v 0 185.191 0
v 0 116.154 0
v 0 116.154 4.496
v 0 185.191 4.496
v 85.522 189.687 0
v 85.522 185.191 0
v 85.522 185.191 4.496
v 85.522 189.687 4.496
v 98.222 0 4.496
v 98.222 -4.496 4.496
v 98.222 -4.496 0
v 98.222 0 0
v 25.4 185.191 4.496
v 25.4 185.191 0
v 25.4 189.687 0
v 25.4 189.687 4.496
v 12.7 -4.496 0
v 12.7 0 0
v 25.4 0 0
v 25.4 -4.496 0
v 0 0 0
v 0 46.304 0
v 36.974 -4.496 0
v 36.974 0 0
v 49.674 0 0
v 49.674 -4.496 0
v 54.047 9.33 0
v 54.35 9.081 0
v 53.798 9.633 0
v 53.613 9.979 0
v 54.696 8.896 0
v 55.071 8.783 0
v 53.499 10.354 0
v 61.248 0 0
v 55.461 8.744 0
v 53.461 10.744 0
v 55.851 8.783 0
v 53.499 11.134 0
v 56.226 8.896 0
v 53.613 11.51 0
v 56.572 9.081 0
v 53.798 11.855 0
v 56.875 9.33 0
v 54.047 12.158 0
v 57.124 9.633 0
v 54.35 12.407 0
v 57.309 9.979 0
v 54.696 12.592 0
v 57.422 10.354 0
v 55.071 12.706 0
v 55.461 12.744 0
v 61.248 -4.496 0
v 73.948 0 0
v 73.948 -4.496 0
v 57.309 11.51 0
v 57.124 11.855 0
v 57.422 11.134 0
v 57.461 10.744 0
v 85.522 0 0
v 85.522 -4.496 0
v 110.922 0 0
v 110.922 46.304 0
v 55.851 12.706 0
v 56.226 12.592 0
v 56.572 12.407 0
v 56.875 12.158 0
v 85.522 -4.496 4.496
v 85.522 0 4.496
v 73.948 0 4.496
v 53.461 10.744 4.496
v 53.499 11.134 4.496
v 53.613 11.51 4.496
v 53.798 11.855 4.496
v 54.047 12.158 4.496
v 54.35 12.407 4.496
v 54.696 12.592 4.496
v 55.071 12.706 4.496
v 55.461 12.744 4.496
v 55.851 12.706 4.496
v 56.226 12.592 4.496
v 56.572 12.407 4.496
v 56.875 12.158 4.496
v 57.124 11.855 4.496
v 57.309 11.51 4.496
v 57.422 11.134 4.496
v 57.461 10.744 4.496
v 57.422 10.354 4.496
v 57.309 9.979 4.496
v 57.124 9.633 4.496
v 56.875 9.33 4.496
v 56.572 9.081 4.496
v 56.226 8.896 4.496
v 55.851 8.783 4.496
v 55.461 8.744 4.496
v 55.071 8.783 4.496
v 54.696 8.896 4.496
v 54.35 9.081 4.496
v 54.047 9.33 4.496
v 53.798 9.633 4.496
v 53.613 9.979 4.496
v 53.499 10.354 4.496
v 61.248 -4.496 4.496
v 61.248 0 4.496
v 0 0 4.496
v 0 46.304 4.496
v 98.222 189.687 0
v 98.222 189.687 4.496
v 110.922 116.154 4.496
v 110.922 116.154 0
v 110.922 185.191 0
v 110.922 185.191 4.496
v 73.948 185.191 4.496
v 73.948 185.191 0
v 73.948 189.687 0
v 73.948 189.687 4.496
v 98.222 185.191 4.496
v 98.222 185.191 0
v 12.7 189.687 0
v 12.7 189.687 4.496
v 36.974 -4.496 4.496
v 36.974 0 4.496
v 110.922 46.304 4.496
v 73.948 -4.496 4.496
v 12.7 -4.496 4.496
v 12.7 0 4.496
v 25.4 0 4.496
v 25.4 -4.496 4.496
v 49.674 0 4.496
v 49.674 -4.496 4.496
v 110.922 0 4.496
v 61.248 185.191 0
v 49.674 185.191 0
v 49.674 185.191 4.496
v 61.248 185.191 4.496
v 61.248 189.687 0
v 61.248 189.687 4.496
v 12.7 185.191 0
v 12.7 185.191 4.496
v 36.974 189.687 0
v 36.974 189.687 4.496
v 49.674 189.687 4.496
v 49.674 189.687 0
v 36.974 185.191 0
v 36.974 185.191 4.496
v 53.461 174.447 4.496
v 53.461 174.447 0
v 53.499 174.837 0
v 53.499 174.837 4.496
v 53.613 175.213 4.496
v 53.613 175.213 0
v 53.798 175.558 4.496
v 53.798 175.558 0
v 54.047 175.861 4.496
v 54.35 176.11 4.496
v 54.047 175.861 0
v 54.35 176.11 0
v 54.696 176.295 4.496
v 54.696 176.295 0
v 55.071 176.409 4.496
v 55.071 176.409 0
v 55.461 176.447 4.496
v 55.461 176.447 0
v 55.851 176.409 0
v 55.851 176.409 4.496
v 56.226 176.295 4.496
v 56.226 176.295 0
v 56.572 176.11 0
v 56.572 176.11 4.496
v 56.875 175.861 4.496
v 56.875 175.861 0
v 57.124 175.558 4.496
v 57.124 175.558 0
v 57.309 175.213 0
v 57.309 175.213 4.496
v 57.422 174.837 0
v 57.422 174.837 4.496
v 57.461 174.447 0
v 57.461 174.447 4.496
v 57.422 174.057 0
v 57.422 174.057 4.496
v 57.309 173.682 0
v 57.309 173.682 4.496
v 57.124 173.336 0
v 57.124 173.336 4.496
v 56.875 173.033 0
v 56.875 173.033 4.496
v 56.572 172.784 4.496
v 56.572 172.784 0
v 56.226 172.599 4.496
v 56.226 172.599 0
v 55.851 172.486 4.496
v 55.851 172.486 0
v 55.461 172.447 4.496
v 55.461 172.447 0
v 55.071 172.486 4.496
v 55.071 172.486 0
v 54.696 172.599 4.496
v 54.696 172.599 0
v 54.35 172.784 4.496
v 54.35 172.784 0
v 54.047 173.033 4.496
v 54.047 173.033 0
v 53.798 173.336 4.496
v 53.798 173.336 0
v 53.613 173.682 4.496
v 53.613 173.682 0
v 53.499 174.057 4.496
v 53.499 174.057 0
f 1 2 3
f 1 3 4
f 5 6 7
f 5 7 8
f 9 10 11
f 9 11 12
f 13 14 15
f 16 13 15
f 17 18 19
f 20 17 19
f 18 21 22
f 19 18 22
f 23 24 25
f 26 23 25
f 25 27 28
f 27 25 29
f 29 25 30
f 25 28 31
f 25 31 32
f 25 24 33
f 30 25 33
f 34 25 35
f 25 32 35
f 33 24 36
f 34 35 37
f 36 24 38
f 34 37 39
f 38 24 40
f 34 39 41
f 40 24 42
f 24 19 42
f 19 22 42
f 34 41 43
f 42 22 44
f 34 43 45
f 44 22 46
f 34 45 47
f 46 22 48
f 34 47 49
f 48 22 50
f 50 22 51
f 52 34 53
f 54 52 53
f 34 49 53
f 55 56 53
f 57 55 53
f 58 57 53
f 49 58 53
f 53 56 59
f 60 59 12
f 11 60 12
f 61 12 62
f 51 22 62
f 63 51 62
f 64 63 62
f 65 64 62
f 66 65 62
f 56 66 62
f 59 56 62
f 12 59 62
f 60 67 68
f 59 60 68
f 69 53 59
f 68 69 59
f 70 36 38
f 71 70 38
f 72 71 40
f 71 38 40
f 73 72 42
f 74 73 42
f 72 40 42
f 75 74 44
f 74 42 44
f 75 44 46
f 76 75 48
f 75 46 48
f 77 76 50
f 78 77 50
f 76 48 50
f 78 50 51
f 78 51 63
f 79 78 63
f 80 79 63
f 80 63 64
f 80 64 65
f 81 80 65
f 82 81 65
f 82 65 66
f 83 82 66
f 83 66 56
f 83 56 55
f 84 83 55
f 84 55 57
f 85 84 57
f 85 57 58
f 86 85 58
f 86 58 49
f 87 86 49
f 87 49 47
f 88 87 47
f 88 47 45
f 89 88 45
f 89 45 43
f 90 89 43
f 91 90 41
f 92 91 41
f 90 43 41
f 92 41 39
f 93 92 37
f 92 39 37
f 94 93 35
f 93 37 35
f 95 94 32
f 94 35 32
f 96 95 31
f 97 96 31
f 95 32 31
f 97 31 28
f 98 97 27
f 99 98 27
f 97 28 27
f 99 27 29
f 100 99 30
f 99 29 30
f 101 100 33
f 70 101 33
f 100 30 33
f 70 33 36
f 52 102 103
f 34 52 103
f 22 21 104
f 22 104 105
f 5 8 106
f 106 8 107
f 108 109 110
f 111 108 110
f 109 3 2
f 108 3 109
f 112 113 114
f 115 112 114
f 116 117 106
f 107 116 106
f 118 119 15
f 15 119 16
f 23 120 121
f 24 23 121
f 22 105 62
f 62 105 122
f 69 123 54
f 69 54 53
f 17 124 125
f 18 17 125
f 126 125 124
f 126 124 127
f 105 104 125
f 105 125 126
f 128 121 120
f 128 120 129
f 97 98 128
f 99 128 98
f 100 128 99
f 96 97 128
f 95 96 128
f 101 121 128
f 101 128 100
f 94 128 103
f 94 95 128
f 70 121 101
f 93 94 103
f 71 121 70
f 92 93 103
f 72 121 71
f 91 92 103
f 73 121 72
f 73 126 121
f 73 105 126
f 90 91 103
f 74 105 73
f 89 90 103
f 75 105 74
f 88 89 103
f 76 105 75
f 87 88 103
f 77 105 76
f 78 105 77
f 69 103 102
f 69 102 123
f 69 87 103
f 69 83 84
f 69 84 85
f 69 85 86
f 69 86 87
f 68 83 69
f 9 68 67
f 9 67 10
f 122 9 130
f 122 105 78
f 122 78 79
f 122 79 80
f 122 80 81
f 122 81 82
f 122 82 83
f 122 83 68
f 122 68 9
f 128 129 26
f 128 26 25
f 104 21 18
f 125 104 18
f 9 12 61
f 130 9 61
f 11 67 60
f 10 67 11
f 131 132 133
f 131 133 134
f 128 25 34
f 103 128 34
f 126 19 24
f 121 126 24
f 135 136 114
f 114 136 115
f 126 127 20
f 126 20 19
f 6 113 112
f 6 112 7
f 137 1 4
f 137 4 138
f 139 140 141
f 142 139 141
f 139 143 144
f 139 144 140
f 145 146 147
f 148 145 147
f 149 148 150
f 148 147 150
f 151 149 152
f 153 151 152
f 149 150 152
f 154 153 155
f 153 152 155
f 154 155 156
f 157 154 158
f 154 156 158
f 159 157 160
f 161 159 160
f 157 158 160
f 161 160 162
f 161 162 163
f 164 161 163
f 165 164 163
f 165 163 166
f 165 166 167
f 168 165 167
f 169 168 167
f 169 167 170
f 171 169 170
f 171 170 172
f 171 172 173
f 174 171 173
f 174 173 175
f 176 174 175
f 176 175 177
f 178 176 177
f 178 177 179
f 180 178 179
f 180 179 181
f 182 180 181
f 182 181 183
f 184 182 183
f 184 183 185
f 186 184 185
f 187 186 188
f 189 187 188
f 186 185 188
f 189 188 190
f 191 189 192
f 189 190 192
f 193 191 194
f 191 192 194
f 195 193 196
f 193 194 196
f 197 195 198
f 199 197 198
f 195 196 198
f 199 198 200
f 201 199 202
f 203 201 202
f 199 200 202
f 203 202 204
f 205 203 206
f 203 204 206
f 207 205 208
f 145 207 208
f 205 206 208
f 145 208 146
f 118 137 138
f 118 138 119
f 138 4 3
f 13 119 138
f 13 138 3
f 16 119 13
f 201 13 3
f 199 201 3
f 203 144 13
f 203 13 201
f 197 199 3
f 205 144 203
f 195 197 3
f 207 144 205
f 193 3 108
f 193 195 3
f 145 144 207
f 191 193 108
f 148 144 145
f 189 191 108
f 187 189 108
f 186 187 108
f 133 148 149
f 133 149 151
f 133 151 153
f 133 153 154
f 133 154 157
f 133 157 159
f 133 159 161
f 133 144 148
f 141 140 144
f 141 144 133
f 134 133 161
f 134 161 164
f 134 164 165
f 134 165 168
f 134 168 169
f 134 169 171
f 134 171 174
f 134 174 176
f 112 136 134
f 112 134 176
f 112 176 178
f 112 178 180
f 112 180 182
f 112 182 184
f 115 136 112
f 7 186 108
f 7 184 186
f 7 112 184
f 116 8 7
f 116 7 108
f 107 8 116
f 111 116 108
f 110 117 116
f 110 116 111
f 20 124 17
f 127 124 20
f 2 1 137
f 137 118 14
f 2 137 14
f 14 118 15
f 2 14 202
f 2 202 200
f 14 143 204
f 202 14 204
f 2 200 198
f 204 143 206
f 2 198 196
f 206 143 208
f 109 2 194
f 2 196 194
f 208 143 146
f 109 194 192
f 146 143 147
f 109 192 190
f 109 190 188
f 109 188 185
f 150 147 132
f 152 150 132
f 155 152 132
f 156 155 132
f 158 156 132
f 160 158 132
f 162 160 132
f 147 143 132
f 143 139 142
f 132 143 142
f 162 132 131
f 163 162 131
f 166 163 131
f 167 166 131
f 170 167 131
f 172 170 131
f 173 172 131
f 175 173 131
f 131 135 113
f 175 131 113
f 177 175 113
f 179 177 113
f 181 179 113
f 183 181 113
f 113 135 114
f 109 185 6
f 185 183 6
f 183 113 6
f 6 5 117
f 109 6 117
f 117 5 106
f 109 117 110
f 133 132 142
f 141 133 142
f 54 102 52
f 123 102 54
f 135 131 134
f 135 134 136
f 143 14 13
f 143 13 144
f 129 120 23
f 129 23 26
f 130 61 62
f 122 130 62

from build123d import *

# Parameters (mm, degrees)
SKETCH1_W           = 110.9218
SKETCH1_H           = 185.1914
BOSS_EXTRUDE1_DEPTH = 4.4958
SKETCH2_W           = 12.7
SKETCH2_H           = 4.4958
BOSS_EXTRUDE2_DEPTH = 4.4958
SKETCH3_W           = 114.3
SKETCH3_H           = 69.85
CUT_EXTRUDE1_DEPTH  = 220.784193646
SKETCH4_R           = 2
CUT_EXTRUDE2_DEPTH  = 220.784193646


with BuildPart() as part:
    # Sketch1 → Boss-Extrude1 (new body)
    with BuildSketch(Plane.XY):
        with Locations((55.4609, 92.5957)):
            Rectangle(SKETCH1_W, SKETCH1_H)
    extrude(amount=BOSS_EXTRUDE1_DEPTH)

    # Sketch2 → Boss-Extrude2 (add)
    with BuildSketch(Plane.XY.offset(4.4958)):
        with Locations((19.05, 187.4393)):
            Rectangle(SKETCH2_W, SKETCH2_H)
        with Locations((43.323933333, 187.4393)):
            Rectangle(SKETCH2_W, SKETCH2_H)
        with Locations((67.597866667, 187.4393)):
            Rectangle(SKETCH2_W, SKETCH2_H)
        with Locations((91.8718, 187.4393)):
            Rectangle(SKETCH2_W, SKETCH2_H)
        with Locations((91.8718, -2.2479)):
            Rectangle(SKETCH2_W, SKETCH2_H)
        with Locations((67.597866667, -2.2479)):
            Rectangle(SKETCH2_W, SKETCH2_H)
        with Locations((43.323933333, -2.2479)):
            Rectangle(SKETCH2_W, SKETCH2_H)
        with Locations((19.05, -2.2479)):
            Rectangle(SKETCH2_W, SKETCH2_H)
    extrude(amount=-BOSS_EXTRUDE2_DEPTH)

    # Sketch3 → Cut-Extrude1 (cut, through all)
    with BuildSketch(Plane.XY.offset(4.4958)):
        with Locations((53.7718, 81.2292)):
            Rectangle(SKETCH3_W, SKETCH3_H)
    extrude(amount=-CUT_EXTRUDE1_DEPTH, mode=Mode.SUBTRACT)


with BuildPart() as cut_extrude1_piece_1:
    # of the separate pieces the step leaves, piece 1, a body of its own (cut_extrude1_pieces)
    add(part.part.solids().sort_by_distance((0, 185.1914, 0))[0])


with BuildPart() as cut_extrude1_piece_2:
    # of the separate pieces the step leaves, piece 2, a body of its own (cut_extrude1_pieces)
    add(part.part.solids().sort_by_distance((0, 0, 0))[0])


with BuildPart() as cut_extrude2_tool:
    # Sketch4 → Cut-Extrude2 (new, through all)
    with BuildSketch(Plane(origin=(0, 0, 0), x_dir=(-1, 0, 0), z_dir=(0, 0, -1))):
        with Locations((-55.4609, 174.4472)):
            Circle(SKETCH4_R)
        with Locations((-55.4609, 10.7442)):
            Circle(SKETCH4_R)
    extrude(amount=-CUT_EXTRUDE2_DEPTH)


with BuildPart() as cut_extrude1_piece_1_1:
    add(cut_extrude1_piece_1.part)

    # Cut-Extrude2: cut by cut_extrude2_tool
    add(cut_extrude2_tool.part, mode=Mode.SUBTRACT)


with BuildPart() as cut_extrude1_piece_2_1:
    add(cut_extrude1_piece_2.part)

    # Cut-Extrude2: cut by cut_extrude2_tool
    add(cut_extrude2_tool.part, mode=Mode.SUBTRACT)


solid = Compound([cut_extrude1_piece_1_1.part, cut_extrude1_piece_2_1.part])
